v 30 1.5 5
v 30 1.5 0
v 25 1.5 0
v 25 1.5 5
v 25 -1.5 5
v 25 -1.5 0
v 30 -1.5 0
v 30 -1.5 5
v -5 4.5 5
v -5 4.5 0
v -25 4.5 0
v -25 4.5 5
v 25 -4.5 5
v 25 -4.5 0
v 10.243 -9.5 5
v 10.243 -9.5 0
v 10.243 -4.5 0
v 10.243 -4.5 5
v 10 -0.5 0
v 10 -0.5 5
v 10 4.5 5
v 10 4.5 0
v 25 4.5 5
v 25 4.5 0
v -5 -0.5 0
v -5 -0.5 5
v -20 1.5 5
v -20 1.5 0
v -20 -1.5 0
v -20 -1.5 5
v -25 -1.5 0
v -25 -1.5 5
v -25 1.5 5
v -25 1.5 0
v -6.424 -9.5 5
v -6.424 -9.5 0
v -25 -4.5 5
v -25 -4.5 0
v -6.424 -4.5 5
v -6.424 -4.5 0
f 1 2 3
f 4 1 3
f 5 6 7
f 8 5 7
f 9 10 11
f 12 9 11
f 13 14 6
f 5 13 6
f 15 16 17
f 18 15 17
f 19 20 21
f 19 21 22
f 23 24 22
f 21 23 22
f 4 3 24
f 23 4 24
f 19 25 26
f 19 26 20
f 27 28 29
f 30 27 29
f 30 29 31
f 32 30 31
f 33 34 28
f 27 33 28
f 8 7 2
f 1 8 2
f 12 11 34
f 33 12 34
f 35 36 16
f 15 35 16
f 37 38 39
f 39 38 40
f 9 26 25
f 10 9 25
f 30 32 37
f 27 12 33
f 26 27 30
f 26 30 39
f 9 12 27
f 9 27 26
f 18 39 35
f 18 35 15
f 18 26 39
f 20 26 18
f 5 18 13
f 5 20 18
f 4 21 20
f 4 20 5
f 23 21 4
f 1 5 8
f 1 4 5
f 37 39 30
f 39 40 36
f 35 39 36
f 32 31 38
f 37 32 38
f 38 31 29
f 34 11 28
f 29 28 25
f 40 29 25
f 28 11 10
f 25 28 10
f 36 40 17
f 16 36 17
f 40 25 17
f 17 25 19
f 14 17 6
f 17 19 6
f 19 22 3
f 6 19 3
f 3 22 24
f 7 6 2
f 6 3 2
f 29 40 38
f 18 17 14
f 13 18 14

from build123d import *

# Parameters (mm, degrees)
BOSS_EXTRUDE1_DEPTH = 5
CAVITY1_START       = -0.5
CAVITY1_OUTLINE_W   = 15
CAVITY1_OUTLINE_H   = 5
CAVITY1_DEPTH       = 5


# Read off the part's stored shape, not the designer's step: Cavity1
with BuildPart() as part:
    # Sketch1 → Boss-Extrude1 (new body)
    with BuildSketch(Plane.XY):
        Polygon((25, 1.5), (25, 4.5), (-25, 4.5), (-25, 1.5), (-20, 1.5), (-20, -1.5), (-25, -1.5), (-25, -4.5), (-6.424137908, -4.5), (-6.424137908, -9.5), (10.242528759, -9.5), (10.242528759, -4.5), (25, -4.5), (25, -1.5), (30, -1.5), (30, 1.5), align=None)
    extrude(amount=BOSS_EXTRUDE1_DEPTH)

    # Cavity1 outline → Cavity1 (cut)
    with BuildSketch(Plane(origin=(0, 0, 0), x_dir=(1, 0, 0), z_dir=(0, 1, 0)).offset(CAVITY1_START)):
        with Locations((2.5, -2.5)):
            Rectangle(CAVITY1_OUTLINE_W, CAVITY1_OUTLINE_H)
    extrude(amount=CAVITY1_DEPTH, mode=Mode.SUBTRACT)


solid = part.part
